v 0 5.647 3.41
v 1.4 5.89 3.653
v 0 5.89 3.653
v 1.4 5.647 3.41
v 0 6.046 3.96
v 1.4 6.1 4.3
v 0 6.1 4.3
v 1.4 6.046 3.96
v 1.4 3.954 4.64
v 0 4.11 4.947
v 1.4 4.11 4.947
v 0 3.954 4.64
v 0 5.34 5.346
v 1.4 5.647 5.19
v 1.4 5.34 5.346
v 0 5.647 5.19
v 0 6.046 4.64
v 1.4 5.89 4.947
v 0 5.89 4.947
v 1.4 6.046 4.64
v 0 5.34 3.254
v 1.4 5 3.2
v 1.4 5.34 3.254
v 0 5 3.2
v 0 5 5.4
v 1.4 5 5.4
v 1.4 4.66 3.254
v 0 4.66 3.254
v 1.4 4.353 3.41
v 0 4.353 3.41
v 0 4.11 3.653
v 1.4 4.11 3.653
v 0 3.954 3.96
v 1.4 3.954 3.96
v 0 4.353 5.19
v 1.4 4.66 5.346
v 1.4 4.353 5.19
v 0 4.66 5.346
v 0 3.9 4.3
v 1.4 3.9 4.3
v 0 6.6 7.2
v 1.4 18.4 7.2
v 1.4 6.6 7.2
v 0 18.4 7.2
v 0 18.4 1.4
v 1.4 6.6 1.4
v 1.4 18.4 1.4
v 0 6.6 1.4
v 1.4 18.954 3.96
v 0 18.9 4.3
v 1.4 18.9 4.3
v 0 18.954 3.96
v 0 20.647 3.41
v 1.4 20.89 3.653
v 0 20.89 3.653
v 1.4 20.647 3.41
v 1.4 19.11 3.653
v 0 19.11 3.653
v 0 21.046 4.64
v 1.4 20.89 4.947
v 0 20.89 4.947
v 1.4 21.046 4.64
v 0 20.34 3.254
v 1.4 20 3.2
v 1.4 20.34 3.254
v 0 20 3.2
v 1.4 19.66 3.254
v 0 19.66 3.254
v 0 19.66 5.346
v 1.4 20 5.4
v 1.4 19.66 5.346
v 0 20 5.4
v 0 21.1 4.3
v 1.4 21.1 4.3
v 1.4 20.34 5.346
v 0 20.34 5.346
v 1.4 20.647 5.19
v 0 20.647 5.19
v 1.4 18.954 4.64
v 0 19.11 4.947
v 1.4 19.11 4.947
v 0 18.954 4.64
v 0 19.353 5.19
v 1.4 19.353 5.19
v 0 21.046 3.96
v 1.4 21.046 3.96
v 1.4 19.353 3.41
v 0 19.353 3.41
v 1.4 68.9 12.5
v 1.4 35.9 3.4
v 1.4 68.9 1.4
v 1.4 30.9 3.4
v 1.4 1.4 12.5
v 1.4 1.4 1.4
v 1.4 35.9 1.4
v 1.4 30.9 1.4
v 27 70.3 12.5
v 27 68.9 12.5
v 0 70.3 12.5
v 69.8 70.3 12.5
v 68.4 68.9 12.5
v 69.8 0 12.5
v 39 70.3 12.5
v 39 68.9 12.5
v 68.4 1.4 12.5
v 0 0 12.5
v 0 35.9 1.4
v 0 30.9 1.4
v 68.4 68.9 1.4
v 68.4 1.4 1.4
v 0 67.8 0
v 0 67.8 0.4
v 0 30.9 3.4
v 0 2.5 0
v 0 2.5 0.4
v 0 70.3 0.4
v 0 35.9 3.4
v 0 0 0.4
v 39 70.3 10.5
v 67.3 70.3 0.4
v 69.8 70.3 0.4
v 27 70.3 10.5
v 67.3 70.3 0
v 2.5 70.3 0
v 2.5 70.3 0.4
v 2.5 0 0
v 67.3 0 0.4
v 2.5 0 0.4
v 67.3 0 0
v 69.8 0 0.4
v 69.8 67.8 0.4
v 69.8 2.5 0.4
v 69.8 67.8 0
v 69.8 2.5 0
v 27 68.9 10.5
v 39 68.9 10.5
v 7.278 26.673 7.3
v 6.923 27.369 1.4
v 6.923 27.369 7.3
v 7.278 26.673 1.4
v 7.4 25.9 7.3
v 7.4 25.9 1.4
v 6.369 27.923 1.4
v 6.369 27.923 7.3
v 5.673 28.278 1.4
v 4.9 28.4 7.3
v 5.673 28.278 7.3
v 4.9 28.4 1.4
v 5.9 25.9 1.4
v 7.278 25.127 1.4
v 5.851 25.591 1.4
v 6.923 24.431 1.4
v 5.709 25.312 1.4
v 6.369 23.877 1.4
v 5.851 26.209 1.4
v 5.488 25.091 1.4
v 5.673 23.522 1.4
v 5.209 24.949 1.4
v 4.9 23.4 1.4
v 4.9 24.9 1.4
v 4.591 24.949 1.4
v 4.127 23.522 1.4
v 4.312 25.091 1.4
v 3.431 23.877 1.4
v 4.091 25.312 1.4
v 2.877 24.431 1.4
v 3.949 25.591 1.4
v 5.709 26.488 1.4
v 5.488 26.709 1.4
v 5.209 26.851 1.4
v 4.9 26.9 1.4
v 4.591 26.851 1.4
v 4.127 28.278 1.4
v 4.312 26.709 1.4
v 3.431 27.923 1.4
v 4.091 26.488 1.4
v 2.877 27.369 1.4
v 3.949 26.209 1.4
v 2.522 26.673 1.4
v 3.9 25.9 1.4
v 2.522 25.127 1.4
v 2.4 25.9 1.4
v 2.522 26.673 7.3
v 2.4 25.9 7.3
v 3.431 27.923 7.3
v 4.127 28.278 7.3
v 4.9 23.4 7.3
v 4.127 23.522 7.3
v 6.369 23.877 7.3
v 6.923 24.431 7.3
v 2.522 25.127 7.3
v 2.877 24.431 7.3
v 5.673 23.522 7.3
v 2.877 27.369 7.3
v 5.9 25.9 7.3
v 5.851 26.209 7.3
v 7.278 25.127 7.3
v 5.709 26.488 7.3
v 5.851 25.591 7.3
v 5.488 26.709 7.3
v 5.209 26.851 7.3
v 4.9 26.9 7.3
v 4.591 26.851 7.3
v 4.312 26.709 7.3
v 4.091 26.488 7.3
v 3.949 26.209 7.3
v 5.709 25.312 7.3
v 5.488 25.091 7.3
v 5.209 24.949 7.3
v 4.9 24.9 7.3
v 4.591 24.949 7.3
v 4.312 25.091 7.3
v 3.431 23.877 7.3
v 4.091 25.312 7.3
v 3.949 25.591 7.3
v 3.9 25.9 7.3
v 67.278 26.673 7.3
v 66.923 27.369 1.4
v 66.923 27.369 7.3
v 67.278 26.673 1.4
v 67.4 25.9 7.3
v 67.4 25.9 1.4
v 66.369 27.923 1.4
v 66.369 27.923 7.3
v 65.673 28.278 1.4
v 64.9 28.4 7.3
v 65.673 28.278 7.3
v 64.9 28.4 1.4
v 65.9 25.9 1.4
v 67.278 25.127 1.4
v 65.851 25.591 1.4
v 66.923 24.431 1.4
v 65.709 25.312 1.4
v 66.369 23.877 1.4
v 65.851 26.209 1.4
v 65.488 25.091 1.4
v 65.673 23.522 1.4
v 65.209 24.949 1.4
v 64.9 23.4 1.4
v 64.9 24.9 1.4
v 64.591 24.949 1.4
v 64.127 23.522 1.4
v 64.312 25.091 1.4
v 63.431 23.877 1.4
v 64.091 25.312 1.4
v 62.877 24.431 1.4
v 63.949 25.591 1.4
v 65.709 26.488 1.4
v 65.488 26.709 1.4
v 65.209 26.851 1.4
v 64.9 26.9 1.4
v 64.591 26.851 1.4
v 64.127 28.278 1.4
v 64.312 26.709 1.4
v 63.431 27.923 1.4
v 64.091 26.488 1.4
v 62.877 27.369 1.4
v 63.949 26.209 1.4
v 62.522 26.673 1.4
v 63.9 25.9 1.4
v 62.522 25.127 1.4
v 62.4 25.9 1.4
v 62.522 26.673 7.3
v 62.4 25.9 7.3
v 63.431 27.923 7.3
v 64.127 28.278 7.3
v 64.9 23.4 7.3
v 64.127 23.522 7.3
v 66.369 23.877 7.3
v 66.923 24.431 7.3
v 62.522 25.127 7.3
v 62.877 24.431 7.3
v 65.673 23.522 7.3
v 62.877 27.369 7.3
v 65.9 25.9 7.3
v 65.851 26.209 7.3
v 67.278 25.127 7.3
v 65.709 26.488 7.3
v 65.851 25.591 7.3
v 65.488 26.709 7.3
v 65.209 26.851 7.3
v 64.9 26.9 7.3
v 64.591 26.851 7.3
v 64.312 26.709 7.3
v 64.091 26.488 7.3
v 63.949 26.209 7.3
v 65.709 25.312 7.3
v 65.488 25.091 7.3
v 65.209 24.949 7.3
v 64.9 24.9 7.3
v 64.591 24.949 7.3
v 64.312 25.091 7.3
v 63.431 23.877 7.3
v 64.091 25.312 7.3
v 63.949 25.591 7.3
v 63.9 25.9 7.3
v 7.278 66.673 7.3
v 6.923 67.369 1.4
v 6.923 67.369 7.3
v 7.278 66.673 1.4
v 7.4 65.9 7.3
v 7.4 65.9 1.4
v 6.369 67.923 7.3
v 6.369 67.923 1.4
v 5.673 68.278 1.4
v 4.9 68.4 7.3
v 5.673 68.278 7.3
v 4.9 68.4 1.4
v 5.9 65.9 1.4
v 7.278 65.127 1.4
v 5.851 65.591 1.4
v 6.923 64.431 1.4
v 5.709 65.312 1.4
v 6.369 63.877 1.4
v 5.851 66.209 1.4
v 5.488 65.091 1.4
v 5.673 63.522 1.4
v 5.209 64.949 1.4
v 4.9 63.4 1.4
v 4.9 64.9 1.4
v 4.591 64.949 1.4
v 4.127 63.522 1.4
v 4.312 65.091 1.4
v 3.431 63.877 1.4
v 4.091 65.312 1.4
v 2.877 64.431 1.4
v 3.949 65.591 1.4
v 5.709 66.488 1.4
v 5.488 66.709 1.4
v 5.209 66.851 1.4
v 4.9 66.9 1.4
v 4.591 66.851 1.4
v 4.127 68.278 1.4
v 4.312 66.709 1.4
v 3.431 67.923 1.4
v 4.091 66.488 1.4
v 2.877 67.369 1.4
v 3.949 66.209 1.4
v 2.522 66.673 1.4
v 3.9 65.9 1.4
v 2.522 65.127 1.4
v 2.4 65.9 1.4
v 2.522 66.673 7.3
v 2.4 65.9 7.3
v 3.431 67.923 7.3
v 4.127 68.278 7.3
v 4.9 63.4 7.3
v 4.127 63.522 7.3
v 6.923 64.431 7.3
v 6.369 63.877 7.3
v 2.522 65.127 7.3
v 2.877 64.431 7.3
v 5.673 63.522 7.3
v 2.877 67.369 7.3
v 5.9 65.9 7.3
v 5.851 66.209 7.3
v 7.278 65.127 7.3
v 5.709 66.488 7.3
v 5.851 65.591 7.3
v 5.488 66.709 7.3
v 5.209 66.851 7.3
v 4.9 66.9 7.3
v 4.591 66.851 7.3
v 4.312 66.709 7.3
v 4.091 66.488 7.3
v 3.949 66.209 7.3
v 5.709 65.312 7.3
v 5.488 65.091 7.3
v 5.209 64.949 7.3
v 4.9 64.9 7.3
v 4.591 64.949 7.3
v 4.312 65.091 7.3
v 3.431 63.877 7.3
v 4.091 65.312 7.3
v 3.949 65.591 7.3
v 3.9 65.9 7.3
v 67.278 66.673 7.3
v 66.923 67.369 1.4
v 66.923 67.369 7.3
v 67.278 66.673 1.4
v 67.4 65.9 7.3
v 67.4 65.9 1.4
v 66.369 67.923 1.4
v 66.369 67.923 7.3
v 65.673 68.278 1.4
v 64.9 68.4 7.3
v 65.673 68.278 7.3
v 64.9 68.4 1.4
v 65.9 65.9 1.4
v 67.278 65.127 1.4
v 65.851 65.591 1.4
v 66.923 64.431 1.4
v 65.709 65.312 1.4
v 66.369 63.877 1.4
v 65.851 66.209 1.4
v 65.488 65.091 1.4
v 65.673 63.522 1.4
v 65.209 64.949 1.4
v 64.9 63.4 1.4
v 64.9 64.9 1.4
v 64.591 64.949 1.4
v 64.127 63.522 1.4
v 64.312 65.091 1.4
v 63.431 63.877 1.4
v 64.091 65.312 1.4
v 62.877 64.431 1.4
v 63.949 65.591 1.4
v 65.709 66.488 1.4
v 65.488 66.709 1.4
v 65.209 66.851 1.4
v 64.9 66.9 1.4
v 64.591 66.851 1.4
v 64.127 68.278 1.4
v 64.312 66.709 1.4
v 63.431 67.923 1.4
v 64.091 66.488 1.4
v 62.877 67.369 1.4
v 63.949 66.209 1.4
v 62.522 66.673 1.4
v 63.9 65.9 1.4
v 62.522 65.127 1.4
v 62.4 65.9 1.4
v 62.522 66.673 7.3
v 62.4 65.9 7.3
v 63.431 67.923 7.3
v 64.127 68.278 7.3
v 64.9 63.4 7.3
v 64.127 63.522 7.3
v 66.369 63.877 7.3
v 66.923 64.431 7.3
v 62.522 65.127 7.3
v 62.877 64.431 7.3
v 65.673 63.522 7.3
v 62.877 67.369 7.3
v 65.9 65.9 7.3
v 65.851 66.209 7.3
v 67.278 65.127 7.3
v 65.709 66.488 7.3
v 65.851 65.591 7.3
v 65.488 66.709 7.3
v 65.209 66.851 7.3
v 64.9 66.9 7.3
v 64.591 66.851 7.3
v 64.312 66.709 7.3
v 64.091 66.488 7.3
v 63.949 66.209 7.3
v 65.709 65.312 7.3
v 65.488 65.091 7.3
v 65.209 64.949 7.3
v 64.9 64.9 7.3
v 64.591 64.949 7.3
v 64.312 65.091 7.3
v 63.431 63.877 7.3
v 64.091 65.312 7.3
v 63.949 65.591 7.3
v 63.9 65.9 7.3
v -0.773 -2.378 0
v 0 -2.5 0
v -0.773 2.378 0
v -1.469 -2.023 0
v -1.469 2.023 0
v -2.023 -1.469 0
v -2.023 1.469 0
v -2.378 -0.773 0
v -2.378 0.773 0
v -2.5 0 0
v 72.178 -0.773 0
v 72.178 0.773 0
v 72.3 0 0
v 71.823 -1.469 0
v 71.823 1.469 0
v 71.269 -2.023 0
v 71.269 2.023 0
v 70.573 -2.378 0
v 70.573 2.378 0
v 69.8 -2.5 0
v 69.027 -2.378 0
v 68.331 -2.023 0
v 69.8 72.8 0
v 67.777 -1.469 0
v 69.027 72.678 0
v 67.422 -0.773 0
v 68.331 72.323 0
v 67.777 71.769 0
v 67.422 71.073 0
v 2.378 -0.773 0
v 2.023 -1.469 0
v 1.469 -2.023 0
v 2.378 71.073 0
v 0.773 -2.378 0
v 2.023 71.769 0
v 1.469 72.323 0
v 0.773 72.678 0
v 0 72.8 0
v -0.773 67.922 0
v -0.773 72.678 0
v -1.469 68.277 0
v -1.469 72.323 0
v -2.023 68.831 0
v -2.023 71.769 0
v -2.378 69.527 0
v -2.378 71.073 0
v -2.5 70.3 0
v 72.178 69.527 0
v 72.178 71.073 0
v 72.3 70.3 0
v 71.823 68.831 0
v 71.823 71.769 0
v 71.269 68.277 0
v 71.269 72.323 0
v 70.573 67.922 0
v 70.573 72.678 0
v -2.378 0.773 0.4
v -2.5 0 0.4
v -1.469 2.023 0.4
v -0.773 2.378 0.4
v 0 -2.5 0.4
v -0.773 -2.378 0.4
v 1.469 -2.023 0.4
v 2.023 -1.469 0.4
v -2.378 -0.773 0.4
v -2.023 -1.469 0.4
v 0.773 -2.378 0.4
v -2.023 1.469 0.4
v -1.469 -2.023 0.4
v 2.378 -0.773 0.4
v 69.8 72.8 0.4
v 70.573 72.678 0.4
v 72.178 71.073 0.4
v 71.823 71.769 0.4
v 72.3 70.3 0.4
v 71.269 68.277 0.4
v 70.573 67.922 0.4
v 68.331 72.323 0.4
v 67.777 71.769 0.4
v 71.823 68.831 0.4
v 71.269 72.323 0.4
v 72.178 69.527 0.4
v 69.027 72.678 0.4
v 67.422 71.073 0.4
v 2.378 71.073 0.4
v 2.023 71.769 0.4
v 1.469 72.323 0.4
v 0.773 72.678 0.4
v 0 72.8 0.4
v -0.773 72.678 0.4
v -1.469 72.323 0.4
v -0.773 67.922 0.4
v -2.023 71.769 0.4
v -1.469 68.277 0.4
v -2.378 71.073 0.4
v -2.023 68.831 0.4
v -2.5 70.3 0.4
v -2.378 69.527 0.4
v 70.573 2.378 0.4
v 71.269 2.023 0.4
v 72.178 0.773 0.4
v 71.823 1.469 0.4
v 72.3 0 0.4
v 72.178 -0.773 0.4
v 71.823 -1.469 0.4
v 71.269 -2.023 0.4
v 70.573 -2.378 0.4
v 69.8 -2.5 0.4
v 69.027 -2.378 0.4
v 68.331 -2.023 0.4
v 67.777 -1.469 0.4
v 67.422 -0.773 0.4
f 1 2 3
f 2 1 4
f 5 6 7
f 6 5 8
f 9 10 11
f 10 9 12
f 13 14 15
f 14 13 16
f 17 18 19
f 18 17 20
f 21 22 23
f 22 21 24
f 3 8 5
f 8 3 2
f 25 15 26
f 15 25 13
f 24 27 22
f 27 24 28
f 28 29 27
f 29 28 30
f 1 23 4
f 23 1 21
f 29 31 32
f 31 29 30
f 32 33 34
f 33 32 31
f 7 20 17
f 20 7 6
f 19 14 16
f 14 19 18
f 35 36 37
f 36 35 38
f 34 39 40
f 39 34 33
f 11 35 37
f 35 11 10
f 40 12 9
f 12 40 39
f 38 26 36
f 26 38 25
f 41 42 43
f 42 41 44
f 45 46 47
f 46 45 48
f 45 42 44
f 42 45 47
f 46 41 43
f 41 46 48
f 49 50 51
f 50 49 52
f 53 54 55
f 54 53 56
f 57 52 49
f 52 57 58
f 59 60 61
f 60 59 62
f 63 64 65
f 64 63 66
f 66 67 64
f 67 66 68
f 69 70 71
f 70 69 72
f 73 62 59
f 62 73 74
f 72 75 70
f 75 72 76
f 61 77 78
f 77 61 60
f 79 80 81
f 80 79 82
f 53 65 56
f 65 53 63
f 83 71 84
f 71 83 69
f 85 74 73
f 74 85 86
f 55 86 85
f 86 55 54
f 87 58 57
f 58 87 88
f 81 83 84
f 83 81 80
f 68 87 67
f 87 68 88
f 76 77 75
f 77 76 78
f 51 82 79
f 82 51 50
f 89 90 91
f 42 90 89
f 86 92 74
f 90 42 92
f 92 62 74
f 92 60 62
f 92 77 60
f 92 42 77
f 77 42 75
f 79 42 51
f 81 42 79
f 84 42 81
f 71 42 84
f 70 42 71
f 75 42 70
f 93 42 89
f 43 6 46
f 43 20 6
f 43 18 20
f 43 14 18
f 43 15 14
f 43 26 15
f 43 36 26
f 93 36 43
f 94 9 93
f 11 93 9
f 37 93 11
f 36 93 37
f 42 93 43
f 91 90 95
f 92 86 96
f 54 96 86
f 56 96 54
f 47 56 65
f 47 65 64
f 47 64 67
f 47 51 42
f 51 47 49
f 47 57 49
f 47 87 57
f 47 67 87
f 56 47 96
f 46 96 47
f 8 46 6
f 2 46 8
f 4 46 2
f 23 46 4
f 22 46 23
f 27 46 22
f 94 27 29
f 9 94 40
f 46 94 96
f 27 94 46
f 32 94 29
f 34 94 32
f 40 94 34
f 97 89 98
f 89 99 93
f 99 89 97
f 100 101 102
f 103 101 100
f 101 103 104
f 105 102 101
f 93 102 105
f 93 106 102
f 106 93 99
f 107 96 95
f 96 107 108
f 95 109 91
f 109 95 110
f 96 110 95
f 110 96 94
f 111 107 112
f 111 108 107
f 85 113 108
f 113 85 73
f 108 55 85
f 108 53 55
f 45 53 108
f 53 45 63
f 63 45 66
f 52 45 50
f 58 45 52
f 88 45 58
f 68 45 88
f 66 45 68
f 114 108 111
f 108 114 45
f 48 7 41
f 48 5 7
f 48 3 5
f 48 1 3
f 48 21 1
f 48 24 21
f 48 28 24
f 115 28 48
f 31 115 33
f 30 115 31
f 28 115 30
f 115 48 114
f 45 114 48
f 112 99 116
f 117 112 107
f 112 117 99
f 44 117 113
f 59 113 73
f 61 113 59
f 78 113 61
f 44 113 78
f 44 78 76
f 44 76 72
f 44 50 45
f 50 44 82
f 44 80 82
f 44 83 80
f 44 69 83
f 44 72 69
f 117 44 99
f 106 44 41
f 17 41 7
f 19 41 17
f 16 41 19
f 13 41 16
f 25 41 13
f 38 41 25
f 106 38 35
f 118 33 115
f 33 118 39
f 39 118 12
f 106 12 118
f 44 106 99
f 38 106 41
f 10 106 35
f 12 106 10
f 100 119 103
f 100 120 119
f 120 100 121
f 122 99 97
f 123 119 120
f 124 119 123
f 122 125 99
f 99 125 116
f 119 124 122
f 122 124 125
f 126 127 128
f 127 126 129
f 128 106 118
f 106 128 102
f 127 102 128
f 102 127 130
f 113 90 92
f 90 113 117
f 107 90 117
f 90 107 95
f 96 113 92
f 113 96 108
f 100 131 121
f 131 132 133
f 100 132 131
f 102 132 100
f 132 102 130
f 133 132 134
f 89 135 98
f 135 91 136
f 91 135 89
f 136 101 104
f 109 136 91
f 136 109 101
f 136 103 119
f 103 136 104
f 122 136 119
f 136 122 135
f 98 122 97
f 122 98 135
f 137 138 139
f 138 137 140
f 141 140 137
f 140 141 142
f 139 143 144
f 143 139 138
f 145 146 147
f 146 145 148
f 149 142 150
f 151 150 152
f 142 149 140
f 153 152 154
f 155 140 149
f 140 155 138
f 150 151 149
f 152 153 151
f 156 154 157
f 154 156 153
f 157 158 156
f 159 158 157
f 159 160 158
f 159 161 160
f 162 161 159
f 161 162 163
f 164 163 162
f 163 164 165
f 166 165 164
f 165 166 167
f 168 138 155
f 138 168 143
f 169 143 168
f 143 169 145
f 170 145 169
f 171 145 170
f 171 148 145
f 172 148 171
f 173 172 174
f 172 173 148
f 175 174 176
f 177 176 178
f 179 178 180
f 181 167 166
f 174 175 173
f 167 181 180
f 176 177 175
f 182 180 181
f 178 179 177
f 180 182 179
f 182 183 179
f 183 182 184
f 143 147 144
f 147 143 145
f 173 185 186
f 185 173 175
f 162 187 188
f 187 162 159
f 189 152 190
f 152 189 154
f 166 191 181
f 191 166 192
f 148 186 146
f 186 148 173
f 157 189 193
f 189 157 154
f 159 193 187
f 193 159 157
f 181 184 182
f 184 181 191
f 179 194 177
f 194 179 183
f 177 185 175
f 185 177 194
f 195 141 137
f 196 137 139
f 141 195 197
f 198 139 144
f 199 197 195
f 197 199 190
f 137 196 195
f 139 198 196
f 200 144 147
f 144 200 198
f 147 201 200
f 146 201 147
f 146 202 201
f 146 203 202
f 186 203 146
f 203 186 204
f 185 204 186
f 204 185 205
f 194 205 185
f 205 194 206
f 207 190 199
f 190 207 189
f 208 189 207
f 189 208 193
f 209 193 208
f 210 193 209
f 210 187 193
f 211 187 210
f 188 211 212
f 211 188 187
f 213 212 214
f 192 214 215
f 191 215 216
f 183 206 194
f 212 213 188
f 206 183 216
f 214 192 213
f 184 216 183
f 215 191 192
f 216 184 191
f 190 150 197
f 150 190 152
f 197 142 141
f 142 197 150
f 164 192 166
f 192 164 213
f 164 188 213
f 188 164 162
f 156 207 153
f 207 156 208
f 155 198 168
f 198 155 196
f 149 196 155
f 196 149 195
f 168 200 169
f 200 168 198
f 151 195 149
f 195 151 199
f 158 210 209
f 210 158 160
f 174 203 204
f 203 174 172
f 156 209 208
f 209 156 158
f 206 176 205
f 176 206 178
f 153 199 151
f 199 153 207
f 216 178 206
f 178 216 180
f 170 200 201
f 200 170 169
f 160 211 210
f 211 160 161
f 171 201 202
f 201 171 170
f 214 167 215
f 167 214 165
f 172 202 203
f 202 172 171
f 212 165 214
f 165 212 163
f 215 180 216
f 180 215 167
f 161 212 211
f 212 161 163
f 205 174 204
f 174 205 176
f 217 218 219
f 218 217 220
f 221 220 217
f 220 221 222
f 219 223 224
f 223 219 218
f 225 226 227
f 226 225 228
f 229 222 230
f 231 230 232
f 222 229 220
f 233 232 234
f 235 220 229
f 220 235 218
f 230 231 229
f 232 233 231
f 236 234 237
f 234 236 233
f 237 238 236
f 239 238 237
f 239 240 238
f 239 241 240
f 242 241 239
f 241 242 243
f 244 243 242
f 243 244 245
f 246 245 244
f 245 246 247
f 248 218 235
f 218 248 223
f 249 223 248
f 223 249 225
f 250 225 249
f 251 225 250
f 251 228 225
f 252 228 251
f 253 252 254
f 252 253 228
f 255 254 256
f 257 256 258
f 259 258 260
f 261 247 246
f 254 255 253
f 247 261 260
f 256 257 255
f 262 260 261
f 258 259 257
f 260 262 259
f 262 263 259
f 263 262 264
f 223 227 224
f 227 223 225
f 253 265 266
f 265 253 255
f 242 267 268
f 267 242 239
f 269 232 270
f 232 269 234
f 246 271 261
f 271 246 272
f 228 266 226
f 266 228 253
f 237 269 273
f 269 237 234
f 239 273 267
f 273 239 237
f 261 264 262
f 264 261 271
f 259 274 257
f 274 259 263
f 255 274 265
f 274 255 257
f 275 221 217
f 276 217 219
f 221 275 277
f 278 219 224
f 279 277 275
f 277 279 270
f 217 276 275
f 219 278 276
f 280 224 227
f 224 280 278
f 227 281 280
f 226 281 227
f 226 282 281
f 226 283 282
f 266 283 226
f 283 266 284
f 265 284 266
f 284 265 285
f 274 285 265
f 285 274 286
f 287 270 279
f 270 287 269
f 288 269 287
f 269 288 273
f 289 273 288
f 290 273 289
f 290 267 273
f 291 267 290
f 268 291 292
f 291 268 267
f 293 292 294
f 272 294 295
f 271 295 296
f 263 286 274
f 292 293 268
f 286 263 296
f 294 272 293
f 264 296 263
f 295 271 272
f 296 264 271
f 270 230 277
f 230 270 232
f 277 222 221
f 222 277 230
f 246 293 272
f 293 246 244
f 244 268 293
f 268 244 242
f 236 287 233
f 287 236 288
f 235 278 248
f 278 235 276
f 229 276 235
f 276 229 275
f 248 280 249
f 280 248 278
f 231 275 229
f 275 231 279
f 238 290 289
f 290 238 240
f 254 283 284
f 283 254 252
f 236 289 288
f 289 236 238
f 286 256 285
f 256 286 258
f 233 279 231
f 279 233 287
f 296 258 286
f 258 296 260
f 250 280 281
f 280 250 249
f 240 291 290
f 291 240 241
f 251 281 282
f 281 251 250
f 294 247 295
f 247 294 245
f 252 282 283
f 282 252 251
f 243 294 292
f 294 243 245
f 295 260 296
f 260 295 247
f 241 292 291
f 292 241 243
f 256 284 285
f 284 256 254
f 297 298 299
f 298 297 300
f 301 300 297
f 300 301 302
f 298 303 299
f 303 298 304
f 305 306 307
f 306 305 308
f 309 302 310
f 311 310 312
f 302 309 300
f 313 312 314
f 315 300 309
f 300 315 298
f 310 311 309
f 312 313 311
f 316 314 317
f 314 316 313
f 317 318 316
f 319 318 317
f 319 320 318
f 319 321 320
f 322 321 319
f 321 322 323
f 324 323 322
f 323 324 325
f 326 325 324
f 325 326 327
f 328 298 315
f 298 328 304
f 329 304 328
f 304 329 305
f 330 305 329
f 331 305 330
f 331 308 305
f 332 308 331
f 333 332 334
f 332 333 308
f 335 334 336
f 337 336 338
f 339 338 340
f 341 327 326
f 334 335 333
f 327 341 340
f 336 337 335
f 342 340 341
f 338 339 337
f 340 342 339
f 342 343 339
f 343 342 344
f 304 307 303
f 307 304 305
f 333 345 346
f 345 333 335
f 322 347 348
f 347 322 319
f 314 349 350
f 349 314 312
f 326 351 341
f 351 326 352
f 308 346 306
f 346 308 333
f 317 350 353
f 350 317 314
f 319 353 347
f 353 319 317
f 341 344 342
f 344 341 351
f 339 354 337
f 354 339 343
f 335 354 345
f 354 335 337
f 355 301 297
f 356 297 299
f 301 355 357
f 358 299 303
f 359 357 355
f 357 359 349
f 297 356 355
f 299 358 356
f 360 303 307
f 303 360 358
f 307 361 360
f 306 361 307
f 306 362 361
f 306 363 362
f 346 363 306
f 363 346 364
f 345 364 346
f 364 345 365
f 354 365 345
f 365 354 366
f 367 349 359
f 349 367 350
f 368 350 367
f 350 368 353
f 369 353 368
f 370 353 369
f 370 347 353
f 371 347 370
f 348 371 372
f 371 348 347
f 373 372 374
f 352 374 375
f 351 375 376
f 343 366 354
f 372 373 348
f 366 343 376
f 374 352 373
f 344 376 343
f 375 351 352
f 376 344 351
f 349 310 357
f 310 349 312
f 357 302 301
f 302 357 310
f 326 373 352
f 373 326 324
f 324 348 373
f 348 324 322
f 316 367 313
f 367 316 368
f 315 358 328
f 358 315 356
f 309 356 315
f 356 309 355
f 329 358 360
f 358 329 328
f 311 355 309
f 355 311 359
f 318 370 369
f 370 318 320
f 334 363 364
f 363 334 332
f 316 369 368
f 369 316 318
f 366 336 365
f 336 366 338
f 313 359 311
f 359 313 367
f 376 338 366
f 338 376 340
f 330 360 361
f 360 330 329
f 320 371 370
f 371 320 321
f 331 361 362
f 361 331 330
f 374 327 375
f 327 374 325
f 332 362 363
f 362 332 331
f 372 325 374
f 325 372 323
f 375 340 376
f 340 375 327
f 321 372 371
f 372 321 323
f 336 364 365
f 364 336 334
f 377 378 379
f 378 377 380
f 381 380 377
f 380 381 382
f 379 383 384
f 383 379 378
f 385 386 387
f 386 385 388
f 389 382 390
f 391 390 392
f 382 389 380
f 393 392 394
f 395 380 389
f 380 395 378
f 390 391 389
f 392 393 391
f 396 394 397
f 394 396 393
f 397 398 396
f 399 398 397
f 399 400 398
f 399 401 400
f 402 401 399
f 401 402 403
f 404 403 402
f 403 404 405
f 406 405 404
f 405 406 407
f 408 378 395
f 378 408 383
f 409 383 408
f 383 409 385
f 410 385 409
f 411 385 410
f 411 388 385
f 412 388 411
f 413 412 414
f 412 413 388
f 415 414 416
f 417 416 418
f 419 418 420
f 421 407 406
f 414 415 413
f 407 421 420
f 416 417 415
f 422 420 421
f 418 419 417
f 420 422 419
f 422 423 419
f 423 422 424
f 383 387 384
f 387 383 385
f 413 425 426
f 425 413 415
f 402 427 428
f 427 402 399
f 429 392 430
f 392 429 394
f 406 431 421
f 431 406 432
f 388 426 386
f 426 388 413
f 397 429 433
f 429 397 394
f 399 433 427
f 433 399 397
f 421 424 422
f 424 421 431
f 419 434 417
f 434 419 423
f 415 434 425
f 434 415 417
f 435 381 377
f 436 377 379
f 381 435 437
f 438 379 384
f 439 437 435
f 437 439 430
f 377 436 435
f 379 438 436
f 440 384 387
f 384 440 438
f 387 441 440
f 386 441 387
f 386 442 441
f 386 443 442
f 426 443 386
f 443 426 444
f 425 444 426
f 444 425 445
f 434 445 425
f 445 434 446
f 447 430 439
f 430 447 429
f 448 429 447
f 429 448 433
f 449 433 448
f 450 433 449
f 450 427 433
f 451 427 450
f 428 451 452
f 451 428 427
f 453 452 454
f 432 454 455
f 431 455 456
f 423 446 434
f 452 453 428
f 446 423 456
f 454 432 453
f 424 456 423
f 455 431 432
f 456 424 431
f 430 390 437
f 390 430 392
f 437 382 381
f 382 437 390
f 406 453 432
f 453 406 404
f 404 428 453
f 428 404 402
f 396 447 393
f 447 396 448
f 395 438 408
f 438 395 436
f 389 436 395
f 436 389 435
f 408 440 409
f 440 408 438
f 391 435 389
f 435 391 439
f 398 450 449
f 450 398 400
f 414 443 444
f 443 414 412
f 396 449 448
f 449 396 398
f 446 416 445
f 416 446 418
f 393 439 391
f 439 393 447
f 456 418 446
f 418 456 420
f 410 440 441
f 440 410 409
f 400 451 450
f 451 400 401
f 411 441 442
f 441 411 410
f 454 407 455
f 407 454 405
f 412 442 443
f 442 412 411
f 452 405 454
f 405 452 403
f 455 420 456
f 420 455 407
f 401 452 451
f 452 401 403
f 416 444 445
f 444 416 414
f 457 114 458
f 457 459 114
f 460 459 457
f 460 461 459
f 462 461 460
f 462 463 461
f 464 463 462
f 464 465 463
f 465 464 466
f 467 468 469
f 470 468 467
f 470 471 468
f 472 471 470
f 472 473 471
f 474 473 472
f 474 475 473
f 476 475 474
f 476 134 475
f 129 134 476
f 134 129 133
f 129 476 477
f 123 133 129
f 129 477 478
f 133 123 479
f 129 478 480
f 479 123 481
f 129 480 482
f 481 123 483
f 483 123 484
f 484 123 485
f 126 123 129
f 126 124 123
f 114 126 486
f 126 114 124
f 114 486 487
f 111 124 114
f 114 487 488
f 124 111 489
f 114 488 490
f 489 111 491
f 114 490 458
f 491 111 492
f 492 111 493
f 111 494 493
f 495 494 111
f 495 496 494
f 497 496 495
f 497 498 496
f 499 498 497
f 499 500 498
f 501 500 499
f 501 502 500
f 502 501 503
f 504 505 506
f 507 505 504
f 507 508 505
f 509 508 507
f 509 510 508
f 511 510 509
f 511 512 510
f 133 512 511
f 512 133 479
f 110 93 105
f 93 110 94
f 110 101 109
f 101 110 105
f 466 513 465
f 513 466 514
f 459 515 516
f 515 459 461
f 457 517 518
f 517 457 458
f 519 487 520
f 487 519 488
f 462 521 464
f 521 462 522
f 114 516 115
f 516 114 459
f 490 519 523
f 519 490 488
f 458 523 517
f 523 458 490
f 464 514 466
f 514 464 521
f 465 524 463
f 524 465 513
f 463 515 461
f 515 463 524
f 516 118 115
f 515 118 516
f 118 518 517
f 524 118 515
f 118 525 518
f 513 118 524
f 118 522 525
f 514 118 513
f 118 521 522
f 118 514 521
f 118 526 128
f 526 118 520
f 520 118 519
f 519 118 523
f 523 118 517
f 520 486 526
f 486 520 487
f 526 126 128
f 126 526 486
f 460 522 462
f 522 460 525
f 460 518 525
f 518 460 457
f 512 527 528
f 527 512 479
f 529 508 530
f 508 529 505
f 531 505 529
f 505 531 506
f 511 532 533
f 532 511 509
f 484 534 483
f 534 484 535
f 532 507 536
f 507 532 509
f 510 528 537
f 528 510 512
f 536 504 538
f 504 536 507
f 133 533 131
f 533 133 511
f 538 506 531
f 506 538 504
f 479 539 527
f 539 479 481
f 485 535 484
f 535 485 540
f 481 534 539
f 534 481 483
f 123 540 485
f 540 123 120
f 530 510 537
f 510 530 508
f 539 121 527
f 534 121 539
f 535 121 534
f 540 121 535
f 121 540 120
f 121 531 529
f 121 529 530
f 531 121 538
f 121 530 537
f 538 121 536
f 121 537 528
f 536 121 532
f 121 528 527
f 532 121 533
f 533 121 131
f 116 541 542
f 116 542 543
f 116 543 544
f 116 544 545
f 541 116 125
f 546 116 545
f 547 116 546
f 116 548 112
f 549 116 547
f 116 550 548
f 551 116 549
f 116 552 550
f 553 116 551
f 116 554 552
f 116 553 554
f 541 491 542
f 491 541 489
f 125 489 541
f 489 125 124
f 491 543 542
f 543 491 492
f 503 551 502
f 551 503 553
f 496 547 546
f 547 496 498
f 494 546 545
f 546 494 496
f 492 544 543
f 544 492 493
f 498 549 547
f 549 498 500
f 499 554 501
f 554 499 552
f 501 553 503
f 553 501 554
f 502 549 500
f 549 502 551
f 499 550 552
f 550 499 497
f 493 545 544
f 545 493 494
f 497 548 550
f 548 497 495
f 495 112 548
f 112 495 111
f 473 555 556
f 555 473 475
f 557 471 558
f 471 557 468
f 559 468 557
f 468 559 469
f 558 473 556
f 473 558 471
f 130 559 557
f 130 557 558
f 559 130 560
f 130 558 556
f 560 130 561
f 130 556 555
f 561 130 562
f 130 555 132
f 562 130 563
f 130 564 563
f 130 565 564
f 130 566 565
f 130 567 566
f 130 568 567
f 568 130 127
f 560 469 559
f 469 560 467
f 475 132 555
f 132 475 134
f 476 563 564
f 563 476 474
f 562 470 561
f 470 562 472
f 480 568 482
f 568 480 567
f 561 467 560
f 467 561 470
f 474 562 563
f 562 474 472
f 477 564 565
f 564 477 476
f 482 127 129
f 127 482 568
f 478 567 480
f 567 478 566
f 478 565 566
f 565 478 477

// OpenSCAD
/*
 * Created by:
 * Thomas Buck <xythobuz@xythobuz.de> in June 2016
 *
 * Licensed under the Creative Commons - Attribution license.
 */

// -----------------------------------------------------------

width = 67;
height = 67.5;
hole_nub = 5;
hole = 2;
hole_width = 60;
hole_height = 40;
hole_offset_top = 3;
wall_size = 1.4;

depth_top = 3.6;
depth_pcb = 1.6;
depth_bottom = 4.1;
depth_gap = 1.8;
depth = depth_top + depth_pcb + depth_bottom + depth_gap;
screw_nub_depth = depth_bottom + depth_gap;

switch_width = 11.8;
switch_height = 5.8;
switch_hole = 2.2;
switch_hole_dist = 15;
switch_x = 2.5;
switch_y = 0;

cutout_width = 12;
cutout_height = 2;
cutout_x = 25.6;

helper_disc = 5;
helper_disc_height = 0.4;

$fn = 20;

// -----------------------------------------------------------

module nub() {
    difference() {
        cylinder(d = hole_nub, h = screw_nub_depth);
        translate([0, 0, -1])
            cylinder(d = hole, h = screw_nub_depth + 2);
    }
}

module nubs() {
    nub();
    
    translate([hole_width, 0, 0])
        nub();
    
    translate([0, hole_height, 0])
        nub();
    
    translate([hole_width, hole_height, 0])
        nub();
}

module switch() {
    translate([0, 0, switch_height / 2])
        rotate([0, 90, 0])
        cylinder(d = switch_hole, h = wall_size + 2);
    translate([0, (switch_hole_dist - switch_width) / 2, 0])
        cube([wall_size + 2, switch_width, switch_height]);
    translate([0, switch_hole_dist, switch_height / 2])
        rotate([0, 90, 0])
        cylinder(d = switch_hole, h = wall_size + 2);
}

// -----------------------------------------------------------

// base
cube([width + (2 * wall_size), height + (2 * wall_size), wall_size]);

// left wall
difference() {
    translate([0, 0, wall_size])
        cube([wall_size, height + (2 * wall_size), depth]);
    
    translate([-1, wall_size + height - hole_offset_top - hole_height + hole_nub, wall_size])
        cube([wall_size + 2, hole_nub, hole]);
    
    translate([-1, (switch_hole / 2) + wall_size + switch_x, wall_size + switch_y])
        switch();
}

// bottom wall
translate([0, 0, wall_size])
    cube([width + (2 * wall_size), wall_size, depth]);

// right wall
translate([width + wall_size, 0, wall_size])
    cube([wall_size, height + (2 * wall_size), depth]);

// top wall
difference() {
    translate([0, height + wall_size, wall_size])
        cube([width + (2 * wall_size), wall_size, depth]);
    translate([wall_size + cutout_x, height + wall_size - 1, wall_size + depth - cutout_height])
        cube([cutout_width, wall_size + 2, cutout_height + 1]);
}

translate([wall_size + (width - hole_width) / 2, wall_size + height - hole_height - hole_offset_top, wall_size])
    nubs();

cylinder(d = helper_disc, h = helper_disc_height);
translate([width + (2 * wall_size), height + (2 * wall_size), 0])
    cylinder(d = helper_disc, h = helper_disc_height);
translate([0, height + (2 * wall_size), 0])
    cylinder(d = helper_disc, h = helper_disc_height);
translate([width + (2 * wall_size), 0, 0])
    cylinder(d = helper_disc, h = helper_disc_height);
